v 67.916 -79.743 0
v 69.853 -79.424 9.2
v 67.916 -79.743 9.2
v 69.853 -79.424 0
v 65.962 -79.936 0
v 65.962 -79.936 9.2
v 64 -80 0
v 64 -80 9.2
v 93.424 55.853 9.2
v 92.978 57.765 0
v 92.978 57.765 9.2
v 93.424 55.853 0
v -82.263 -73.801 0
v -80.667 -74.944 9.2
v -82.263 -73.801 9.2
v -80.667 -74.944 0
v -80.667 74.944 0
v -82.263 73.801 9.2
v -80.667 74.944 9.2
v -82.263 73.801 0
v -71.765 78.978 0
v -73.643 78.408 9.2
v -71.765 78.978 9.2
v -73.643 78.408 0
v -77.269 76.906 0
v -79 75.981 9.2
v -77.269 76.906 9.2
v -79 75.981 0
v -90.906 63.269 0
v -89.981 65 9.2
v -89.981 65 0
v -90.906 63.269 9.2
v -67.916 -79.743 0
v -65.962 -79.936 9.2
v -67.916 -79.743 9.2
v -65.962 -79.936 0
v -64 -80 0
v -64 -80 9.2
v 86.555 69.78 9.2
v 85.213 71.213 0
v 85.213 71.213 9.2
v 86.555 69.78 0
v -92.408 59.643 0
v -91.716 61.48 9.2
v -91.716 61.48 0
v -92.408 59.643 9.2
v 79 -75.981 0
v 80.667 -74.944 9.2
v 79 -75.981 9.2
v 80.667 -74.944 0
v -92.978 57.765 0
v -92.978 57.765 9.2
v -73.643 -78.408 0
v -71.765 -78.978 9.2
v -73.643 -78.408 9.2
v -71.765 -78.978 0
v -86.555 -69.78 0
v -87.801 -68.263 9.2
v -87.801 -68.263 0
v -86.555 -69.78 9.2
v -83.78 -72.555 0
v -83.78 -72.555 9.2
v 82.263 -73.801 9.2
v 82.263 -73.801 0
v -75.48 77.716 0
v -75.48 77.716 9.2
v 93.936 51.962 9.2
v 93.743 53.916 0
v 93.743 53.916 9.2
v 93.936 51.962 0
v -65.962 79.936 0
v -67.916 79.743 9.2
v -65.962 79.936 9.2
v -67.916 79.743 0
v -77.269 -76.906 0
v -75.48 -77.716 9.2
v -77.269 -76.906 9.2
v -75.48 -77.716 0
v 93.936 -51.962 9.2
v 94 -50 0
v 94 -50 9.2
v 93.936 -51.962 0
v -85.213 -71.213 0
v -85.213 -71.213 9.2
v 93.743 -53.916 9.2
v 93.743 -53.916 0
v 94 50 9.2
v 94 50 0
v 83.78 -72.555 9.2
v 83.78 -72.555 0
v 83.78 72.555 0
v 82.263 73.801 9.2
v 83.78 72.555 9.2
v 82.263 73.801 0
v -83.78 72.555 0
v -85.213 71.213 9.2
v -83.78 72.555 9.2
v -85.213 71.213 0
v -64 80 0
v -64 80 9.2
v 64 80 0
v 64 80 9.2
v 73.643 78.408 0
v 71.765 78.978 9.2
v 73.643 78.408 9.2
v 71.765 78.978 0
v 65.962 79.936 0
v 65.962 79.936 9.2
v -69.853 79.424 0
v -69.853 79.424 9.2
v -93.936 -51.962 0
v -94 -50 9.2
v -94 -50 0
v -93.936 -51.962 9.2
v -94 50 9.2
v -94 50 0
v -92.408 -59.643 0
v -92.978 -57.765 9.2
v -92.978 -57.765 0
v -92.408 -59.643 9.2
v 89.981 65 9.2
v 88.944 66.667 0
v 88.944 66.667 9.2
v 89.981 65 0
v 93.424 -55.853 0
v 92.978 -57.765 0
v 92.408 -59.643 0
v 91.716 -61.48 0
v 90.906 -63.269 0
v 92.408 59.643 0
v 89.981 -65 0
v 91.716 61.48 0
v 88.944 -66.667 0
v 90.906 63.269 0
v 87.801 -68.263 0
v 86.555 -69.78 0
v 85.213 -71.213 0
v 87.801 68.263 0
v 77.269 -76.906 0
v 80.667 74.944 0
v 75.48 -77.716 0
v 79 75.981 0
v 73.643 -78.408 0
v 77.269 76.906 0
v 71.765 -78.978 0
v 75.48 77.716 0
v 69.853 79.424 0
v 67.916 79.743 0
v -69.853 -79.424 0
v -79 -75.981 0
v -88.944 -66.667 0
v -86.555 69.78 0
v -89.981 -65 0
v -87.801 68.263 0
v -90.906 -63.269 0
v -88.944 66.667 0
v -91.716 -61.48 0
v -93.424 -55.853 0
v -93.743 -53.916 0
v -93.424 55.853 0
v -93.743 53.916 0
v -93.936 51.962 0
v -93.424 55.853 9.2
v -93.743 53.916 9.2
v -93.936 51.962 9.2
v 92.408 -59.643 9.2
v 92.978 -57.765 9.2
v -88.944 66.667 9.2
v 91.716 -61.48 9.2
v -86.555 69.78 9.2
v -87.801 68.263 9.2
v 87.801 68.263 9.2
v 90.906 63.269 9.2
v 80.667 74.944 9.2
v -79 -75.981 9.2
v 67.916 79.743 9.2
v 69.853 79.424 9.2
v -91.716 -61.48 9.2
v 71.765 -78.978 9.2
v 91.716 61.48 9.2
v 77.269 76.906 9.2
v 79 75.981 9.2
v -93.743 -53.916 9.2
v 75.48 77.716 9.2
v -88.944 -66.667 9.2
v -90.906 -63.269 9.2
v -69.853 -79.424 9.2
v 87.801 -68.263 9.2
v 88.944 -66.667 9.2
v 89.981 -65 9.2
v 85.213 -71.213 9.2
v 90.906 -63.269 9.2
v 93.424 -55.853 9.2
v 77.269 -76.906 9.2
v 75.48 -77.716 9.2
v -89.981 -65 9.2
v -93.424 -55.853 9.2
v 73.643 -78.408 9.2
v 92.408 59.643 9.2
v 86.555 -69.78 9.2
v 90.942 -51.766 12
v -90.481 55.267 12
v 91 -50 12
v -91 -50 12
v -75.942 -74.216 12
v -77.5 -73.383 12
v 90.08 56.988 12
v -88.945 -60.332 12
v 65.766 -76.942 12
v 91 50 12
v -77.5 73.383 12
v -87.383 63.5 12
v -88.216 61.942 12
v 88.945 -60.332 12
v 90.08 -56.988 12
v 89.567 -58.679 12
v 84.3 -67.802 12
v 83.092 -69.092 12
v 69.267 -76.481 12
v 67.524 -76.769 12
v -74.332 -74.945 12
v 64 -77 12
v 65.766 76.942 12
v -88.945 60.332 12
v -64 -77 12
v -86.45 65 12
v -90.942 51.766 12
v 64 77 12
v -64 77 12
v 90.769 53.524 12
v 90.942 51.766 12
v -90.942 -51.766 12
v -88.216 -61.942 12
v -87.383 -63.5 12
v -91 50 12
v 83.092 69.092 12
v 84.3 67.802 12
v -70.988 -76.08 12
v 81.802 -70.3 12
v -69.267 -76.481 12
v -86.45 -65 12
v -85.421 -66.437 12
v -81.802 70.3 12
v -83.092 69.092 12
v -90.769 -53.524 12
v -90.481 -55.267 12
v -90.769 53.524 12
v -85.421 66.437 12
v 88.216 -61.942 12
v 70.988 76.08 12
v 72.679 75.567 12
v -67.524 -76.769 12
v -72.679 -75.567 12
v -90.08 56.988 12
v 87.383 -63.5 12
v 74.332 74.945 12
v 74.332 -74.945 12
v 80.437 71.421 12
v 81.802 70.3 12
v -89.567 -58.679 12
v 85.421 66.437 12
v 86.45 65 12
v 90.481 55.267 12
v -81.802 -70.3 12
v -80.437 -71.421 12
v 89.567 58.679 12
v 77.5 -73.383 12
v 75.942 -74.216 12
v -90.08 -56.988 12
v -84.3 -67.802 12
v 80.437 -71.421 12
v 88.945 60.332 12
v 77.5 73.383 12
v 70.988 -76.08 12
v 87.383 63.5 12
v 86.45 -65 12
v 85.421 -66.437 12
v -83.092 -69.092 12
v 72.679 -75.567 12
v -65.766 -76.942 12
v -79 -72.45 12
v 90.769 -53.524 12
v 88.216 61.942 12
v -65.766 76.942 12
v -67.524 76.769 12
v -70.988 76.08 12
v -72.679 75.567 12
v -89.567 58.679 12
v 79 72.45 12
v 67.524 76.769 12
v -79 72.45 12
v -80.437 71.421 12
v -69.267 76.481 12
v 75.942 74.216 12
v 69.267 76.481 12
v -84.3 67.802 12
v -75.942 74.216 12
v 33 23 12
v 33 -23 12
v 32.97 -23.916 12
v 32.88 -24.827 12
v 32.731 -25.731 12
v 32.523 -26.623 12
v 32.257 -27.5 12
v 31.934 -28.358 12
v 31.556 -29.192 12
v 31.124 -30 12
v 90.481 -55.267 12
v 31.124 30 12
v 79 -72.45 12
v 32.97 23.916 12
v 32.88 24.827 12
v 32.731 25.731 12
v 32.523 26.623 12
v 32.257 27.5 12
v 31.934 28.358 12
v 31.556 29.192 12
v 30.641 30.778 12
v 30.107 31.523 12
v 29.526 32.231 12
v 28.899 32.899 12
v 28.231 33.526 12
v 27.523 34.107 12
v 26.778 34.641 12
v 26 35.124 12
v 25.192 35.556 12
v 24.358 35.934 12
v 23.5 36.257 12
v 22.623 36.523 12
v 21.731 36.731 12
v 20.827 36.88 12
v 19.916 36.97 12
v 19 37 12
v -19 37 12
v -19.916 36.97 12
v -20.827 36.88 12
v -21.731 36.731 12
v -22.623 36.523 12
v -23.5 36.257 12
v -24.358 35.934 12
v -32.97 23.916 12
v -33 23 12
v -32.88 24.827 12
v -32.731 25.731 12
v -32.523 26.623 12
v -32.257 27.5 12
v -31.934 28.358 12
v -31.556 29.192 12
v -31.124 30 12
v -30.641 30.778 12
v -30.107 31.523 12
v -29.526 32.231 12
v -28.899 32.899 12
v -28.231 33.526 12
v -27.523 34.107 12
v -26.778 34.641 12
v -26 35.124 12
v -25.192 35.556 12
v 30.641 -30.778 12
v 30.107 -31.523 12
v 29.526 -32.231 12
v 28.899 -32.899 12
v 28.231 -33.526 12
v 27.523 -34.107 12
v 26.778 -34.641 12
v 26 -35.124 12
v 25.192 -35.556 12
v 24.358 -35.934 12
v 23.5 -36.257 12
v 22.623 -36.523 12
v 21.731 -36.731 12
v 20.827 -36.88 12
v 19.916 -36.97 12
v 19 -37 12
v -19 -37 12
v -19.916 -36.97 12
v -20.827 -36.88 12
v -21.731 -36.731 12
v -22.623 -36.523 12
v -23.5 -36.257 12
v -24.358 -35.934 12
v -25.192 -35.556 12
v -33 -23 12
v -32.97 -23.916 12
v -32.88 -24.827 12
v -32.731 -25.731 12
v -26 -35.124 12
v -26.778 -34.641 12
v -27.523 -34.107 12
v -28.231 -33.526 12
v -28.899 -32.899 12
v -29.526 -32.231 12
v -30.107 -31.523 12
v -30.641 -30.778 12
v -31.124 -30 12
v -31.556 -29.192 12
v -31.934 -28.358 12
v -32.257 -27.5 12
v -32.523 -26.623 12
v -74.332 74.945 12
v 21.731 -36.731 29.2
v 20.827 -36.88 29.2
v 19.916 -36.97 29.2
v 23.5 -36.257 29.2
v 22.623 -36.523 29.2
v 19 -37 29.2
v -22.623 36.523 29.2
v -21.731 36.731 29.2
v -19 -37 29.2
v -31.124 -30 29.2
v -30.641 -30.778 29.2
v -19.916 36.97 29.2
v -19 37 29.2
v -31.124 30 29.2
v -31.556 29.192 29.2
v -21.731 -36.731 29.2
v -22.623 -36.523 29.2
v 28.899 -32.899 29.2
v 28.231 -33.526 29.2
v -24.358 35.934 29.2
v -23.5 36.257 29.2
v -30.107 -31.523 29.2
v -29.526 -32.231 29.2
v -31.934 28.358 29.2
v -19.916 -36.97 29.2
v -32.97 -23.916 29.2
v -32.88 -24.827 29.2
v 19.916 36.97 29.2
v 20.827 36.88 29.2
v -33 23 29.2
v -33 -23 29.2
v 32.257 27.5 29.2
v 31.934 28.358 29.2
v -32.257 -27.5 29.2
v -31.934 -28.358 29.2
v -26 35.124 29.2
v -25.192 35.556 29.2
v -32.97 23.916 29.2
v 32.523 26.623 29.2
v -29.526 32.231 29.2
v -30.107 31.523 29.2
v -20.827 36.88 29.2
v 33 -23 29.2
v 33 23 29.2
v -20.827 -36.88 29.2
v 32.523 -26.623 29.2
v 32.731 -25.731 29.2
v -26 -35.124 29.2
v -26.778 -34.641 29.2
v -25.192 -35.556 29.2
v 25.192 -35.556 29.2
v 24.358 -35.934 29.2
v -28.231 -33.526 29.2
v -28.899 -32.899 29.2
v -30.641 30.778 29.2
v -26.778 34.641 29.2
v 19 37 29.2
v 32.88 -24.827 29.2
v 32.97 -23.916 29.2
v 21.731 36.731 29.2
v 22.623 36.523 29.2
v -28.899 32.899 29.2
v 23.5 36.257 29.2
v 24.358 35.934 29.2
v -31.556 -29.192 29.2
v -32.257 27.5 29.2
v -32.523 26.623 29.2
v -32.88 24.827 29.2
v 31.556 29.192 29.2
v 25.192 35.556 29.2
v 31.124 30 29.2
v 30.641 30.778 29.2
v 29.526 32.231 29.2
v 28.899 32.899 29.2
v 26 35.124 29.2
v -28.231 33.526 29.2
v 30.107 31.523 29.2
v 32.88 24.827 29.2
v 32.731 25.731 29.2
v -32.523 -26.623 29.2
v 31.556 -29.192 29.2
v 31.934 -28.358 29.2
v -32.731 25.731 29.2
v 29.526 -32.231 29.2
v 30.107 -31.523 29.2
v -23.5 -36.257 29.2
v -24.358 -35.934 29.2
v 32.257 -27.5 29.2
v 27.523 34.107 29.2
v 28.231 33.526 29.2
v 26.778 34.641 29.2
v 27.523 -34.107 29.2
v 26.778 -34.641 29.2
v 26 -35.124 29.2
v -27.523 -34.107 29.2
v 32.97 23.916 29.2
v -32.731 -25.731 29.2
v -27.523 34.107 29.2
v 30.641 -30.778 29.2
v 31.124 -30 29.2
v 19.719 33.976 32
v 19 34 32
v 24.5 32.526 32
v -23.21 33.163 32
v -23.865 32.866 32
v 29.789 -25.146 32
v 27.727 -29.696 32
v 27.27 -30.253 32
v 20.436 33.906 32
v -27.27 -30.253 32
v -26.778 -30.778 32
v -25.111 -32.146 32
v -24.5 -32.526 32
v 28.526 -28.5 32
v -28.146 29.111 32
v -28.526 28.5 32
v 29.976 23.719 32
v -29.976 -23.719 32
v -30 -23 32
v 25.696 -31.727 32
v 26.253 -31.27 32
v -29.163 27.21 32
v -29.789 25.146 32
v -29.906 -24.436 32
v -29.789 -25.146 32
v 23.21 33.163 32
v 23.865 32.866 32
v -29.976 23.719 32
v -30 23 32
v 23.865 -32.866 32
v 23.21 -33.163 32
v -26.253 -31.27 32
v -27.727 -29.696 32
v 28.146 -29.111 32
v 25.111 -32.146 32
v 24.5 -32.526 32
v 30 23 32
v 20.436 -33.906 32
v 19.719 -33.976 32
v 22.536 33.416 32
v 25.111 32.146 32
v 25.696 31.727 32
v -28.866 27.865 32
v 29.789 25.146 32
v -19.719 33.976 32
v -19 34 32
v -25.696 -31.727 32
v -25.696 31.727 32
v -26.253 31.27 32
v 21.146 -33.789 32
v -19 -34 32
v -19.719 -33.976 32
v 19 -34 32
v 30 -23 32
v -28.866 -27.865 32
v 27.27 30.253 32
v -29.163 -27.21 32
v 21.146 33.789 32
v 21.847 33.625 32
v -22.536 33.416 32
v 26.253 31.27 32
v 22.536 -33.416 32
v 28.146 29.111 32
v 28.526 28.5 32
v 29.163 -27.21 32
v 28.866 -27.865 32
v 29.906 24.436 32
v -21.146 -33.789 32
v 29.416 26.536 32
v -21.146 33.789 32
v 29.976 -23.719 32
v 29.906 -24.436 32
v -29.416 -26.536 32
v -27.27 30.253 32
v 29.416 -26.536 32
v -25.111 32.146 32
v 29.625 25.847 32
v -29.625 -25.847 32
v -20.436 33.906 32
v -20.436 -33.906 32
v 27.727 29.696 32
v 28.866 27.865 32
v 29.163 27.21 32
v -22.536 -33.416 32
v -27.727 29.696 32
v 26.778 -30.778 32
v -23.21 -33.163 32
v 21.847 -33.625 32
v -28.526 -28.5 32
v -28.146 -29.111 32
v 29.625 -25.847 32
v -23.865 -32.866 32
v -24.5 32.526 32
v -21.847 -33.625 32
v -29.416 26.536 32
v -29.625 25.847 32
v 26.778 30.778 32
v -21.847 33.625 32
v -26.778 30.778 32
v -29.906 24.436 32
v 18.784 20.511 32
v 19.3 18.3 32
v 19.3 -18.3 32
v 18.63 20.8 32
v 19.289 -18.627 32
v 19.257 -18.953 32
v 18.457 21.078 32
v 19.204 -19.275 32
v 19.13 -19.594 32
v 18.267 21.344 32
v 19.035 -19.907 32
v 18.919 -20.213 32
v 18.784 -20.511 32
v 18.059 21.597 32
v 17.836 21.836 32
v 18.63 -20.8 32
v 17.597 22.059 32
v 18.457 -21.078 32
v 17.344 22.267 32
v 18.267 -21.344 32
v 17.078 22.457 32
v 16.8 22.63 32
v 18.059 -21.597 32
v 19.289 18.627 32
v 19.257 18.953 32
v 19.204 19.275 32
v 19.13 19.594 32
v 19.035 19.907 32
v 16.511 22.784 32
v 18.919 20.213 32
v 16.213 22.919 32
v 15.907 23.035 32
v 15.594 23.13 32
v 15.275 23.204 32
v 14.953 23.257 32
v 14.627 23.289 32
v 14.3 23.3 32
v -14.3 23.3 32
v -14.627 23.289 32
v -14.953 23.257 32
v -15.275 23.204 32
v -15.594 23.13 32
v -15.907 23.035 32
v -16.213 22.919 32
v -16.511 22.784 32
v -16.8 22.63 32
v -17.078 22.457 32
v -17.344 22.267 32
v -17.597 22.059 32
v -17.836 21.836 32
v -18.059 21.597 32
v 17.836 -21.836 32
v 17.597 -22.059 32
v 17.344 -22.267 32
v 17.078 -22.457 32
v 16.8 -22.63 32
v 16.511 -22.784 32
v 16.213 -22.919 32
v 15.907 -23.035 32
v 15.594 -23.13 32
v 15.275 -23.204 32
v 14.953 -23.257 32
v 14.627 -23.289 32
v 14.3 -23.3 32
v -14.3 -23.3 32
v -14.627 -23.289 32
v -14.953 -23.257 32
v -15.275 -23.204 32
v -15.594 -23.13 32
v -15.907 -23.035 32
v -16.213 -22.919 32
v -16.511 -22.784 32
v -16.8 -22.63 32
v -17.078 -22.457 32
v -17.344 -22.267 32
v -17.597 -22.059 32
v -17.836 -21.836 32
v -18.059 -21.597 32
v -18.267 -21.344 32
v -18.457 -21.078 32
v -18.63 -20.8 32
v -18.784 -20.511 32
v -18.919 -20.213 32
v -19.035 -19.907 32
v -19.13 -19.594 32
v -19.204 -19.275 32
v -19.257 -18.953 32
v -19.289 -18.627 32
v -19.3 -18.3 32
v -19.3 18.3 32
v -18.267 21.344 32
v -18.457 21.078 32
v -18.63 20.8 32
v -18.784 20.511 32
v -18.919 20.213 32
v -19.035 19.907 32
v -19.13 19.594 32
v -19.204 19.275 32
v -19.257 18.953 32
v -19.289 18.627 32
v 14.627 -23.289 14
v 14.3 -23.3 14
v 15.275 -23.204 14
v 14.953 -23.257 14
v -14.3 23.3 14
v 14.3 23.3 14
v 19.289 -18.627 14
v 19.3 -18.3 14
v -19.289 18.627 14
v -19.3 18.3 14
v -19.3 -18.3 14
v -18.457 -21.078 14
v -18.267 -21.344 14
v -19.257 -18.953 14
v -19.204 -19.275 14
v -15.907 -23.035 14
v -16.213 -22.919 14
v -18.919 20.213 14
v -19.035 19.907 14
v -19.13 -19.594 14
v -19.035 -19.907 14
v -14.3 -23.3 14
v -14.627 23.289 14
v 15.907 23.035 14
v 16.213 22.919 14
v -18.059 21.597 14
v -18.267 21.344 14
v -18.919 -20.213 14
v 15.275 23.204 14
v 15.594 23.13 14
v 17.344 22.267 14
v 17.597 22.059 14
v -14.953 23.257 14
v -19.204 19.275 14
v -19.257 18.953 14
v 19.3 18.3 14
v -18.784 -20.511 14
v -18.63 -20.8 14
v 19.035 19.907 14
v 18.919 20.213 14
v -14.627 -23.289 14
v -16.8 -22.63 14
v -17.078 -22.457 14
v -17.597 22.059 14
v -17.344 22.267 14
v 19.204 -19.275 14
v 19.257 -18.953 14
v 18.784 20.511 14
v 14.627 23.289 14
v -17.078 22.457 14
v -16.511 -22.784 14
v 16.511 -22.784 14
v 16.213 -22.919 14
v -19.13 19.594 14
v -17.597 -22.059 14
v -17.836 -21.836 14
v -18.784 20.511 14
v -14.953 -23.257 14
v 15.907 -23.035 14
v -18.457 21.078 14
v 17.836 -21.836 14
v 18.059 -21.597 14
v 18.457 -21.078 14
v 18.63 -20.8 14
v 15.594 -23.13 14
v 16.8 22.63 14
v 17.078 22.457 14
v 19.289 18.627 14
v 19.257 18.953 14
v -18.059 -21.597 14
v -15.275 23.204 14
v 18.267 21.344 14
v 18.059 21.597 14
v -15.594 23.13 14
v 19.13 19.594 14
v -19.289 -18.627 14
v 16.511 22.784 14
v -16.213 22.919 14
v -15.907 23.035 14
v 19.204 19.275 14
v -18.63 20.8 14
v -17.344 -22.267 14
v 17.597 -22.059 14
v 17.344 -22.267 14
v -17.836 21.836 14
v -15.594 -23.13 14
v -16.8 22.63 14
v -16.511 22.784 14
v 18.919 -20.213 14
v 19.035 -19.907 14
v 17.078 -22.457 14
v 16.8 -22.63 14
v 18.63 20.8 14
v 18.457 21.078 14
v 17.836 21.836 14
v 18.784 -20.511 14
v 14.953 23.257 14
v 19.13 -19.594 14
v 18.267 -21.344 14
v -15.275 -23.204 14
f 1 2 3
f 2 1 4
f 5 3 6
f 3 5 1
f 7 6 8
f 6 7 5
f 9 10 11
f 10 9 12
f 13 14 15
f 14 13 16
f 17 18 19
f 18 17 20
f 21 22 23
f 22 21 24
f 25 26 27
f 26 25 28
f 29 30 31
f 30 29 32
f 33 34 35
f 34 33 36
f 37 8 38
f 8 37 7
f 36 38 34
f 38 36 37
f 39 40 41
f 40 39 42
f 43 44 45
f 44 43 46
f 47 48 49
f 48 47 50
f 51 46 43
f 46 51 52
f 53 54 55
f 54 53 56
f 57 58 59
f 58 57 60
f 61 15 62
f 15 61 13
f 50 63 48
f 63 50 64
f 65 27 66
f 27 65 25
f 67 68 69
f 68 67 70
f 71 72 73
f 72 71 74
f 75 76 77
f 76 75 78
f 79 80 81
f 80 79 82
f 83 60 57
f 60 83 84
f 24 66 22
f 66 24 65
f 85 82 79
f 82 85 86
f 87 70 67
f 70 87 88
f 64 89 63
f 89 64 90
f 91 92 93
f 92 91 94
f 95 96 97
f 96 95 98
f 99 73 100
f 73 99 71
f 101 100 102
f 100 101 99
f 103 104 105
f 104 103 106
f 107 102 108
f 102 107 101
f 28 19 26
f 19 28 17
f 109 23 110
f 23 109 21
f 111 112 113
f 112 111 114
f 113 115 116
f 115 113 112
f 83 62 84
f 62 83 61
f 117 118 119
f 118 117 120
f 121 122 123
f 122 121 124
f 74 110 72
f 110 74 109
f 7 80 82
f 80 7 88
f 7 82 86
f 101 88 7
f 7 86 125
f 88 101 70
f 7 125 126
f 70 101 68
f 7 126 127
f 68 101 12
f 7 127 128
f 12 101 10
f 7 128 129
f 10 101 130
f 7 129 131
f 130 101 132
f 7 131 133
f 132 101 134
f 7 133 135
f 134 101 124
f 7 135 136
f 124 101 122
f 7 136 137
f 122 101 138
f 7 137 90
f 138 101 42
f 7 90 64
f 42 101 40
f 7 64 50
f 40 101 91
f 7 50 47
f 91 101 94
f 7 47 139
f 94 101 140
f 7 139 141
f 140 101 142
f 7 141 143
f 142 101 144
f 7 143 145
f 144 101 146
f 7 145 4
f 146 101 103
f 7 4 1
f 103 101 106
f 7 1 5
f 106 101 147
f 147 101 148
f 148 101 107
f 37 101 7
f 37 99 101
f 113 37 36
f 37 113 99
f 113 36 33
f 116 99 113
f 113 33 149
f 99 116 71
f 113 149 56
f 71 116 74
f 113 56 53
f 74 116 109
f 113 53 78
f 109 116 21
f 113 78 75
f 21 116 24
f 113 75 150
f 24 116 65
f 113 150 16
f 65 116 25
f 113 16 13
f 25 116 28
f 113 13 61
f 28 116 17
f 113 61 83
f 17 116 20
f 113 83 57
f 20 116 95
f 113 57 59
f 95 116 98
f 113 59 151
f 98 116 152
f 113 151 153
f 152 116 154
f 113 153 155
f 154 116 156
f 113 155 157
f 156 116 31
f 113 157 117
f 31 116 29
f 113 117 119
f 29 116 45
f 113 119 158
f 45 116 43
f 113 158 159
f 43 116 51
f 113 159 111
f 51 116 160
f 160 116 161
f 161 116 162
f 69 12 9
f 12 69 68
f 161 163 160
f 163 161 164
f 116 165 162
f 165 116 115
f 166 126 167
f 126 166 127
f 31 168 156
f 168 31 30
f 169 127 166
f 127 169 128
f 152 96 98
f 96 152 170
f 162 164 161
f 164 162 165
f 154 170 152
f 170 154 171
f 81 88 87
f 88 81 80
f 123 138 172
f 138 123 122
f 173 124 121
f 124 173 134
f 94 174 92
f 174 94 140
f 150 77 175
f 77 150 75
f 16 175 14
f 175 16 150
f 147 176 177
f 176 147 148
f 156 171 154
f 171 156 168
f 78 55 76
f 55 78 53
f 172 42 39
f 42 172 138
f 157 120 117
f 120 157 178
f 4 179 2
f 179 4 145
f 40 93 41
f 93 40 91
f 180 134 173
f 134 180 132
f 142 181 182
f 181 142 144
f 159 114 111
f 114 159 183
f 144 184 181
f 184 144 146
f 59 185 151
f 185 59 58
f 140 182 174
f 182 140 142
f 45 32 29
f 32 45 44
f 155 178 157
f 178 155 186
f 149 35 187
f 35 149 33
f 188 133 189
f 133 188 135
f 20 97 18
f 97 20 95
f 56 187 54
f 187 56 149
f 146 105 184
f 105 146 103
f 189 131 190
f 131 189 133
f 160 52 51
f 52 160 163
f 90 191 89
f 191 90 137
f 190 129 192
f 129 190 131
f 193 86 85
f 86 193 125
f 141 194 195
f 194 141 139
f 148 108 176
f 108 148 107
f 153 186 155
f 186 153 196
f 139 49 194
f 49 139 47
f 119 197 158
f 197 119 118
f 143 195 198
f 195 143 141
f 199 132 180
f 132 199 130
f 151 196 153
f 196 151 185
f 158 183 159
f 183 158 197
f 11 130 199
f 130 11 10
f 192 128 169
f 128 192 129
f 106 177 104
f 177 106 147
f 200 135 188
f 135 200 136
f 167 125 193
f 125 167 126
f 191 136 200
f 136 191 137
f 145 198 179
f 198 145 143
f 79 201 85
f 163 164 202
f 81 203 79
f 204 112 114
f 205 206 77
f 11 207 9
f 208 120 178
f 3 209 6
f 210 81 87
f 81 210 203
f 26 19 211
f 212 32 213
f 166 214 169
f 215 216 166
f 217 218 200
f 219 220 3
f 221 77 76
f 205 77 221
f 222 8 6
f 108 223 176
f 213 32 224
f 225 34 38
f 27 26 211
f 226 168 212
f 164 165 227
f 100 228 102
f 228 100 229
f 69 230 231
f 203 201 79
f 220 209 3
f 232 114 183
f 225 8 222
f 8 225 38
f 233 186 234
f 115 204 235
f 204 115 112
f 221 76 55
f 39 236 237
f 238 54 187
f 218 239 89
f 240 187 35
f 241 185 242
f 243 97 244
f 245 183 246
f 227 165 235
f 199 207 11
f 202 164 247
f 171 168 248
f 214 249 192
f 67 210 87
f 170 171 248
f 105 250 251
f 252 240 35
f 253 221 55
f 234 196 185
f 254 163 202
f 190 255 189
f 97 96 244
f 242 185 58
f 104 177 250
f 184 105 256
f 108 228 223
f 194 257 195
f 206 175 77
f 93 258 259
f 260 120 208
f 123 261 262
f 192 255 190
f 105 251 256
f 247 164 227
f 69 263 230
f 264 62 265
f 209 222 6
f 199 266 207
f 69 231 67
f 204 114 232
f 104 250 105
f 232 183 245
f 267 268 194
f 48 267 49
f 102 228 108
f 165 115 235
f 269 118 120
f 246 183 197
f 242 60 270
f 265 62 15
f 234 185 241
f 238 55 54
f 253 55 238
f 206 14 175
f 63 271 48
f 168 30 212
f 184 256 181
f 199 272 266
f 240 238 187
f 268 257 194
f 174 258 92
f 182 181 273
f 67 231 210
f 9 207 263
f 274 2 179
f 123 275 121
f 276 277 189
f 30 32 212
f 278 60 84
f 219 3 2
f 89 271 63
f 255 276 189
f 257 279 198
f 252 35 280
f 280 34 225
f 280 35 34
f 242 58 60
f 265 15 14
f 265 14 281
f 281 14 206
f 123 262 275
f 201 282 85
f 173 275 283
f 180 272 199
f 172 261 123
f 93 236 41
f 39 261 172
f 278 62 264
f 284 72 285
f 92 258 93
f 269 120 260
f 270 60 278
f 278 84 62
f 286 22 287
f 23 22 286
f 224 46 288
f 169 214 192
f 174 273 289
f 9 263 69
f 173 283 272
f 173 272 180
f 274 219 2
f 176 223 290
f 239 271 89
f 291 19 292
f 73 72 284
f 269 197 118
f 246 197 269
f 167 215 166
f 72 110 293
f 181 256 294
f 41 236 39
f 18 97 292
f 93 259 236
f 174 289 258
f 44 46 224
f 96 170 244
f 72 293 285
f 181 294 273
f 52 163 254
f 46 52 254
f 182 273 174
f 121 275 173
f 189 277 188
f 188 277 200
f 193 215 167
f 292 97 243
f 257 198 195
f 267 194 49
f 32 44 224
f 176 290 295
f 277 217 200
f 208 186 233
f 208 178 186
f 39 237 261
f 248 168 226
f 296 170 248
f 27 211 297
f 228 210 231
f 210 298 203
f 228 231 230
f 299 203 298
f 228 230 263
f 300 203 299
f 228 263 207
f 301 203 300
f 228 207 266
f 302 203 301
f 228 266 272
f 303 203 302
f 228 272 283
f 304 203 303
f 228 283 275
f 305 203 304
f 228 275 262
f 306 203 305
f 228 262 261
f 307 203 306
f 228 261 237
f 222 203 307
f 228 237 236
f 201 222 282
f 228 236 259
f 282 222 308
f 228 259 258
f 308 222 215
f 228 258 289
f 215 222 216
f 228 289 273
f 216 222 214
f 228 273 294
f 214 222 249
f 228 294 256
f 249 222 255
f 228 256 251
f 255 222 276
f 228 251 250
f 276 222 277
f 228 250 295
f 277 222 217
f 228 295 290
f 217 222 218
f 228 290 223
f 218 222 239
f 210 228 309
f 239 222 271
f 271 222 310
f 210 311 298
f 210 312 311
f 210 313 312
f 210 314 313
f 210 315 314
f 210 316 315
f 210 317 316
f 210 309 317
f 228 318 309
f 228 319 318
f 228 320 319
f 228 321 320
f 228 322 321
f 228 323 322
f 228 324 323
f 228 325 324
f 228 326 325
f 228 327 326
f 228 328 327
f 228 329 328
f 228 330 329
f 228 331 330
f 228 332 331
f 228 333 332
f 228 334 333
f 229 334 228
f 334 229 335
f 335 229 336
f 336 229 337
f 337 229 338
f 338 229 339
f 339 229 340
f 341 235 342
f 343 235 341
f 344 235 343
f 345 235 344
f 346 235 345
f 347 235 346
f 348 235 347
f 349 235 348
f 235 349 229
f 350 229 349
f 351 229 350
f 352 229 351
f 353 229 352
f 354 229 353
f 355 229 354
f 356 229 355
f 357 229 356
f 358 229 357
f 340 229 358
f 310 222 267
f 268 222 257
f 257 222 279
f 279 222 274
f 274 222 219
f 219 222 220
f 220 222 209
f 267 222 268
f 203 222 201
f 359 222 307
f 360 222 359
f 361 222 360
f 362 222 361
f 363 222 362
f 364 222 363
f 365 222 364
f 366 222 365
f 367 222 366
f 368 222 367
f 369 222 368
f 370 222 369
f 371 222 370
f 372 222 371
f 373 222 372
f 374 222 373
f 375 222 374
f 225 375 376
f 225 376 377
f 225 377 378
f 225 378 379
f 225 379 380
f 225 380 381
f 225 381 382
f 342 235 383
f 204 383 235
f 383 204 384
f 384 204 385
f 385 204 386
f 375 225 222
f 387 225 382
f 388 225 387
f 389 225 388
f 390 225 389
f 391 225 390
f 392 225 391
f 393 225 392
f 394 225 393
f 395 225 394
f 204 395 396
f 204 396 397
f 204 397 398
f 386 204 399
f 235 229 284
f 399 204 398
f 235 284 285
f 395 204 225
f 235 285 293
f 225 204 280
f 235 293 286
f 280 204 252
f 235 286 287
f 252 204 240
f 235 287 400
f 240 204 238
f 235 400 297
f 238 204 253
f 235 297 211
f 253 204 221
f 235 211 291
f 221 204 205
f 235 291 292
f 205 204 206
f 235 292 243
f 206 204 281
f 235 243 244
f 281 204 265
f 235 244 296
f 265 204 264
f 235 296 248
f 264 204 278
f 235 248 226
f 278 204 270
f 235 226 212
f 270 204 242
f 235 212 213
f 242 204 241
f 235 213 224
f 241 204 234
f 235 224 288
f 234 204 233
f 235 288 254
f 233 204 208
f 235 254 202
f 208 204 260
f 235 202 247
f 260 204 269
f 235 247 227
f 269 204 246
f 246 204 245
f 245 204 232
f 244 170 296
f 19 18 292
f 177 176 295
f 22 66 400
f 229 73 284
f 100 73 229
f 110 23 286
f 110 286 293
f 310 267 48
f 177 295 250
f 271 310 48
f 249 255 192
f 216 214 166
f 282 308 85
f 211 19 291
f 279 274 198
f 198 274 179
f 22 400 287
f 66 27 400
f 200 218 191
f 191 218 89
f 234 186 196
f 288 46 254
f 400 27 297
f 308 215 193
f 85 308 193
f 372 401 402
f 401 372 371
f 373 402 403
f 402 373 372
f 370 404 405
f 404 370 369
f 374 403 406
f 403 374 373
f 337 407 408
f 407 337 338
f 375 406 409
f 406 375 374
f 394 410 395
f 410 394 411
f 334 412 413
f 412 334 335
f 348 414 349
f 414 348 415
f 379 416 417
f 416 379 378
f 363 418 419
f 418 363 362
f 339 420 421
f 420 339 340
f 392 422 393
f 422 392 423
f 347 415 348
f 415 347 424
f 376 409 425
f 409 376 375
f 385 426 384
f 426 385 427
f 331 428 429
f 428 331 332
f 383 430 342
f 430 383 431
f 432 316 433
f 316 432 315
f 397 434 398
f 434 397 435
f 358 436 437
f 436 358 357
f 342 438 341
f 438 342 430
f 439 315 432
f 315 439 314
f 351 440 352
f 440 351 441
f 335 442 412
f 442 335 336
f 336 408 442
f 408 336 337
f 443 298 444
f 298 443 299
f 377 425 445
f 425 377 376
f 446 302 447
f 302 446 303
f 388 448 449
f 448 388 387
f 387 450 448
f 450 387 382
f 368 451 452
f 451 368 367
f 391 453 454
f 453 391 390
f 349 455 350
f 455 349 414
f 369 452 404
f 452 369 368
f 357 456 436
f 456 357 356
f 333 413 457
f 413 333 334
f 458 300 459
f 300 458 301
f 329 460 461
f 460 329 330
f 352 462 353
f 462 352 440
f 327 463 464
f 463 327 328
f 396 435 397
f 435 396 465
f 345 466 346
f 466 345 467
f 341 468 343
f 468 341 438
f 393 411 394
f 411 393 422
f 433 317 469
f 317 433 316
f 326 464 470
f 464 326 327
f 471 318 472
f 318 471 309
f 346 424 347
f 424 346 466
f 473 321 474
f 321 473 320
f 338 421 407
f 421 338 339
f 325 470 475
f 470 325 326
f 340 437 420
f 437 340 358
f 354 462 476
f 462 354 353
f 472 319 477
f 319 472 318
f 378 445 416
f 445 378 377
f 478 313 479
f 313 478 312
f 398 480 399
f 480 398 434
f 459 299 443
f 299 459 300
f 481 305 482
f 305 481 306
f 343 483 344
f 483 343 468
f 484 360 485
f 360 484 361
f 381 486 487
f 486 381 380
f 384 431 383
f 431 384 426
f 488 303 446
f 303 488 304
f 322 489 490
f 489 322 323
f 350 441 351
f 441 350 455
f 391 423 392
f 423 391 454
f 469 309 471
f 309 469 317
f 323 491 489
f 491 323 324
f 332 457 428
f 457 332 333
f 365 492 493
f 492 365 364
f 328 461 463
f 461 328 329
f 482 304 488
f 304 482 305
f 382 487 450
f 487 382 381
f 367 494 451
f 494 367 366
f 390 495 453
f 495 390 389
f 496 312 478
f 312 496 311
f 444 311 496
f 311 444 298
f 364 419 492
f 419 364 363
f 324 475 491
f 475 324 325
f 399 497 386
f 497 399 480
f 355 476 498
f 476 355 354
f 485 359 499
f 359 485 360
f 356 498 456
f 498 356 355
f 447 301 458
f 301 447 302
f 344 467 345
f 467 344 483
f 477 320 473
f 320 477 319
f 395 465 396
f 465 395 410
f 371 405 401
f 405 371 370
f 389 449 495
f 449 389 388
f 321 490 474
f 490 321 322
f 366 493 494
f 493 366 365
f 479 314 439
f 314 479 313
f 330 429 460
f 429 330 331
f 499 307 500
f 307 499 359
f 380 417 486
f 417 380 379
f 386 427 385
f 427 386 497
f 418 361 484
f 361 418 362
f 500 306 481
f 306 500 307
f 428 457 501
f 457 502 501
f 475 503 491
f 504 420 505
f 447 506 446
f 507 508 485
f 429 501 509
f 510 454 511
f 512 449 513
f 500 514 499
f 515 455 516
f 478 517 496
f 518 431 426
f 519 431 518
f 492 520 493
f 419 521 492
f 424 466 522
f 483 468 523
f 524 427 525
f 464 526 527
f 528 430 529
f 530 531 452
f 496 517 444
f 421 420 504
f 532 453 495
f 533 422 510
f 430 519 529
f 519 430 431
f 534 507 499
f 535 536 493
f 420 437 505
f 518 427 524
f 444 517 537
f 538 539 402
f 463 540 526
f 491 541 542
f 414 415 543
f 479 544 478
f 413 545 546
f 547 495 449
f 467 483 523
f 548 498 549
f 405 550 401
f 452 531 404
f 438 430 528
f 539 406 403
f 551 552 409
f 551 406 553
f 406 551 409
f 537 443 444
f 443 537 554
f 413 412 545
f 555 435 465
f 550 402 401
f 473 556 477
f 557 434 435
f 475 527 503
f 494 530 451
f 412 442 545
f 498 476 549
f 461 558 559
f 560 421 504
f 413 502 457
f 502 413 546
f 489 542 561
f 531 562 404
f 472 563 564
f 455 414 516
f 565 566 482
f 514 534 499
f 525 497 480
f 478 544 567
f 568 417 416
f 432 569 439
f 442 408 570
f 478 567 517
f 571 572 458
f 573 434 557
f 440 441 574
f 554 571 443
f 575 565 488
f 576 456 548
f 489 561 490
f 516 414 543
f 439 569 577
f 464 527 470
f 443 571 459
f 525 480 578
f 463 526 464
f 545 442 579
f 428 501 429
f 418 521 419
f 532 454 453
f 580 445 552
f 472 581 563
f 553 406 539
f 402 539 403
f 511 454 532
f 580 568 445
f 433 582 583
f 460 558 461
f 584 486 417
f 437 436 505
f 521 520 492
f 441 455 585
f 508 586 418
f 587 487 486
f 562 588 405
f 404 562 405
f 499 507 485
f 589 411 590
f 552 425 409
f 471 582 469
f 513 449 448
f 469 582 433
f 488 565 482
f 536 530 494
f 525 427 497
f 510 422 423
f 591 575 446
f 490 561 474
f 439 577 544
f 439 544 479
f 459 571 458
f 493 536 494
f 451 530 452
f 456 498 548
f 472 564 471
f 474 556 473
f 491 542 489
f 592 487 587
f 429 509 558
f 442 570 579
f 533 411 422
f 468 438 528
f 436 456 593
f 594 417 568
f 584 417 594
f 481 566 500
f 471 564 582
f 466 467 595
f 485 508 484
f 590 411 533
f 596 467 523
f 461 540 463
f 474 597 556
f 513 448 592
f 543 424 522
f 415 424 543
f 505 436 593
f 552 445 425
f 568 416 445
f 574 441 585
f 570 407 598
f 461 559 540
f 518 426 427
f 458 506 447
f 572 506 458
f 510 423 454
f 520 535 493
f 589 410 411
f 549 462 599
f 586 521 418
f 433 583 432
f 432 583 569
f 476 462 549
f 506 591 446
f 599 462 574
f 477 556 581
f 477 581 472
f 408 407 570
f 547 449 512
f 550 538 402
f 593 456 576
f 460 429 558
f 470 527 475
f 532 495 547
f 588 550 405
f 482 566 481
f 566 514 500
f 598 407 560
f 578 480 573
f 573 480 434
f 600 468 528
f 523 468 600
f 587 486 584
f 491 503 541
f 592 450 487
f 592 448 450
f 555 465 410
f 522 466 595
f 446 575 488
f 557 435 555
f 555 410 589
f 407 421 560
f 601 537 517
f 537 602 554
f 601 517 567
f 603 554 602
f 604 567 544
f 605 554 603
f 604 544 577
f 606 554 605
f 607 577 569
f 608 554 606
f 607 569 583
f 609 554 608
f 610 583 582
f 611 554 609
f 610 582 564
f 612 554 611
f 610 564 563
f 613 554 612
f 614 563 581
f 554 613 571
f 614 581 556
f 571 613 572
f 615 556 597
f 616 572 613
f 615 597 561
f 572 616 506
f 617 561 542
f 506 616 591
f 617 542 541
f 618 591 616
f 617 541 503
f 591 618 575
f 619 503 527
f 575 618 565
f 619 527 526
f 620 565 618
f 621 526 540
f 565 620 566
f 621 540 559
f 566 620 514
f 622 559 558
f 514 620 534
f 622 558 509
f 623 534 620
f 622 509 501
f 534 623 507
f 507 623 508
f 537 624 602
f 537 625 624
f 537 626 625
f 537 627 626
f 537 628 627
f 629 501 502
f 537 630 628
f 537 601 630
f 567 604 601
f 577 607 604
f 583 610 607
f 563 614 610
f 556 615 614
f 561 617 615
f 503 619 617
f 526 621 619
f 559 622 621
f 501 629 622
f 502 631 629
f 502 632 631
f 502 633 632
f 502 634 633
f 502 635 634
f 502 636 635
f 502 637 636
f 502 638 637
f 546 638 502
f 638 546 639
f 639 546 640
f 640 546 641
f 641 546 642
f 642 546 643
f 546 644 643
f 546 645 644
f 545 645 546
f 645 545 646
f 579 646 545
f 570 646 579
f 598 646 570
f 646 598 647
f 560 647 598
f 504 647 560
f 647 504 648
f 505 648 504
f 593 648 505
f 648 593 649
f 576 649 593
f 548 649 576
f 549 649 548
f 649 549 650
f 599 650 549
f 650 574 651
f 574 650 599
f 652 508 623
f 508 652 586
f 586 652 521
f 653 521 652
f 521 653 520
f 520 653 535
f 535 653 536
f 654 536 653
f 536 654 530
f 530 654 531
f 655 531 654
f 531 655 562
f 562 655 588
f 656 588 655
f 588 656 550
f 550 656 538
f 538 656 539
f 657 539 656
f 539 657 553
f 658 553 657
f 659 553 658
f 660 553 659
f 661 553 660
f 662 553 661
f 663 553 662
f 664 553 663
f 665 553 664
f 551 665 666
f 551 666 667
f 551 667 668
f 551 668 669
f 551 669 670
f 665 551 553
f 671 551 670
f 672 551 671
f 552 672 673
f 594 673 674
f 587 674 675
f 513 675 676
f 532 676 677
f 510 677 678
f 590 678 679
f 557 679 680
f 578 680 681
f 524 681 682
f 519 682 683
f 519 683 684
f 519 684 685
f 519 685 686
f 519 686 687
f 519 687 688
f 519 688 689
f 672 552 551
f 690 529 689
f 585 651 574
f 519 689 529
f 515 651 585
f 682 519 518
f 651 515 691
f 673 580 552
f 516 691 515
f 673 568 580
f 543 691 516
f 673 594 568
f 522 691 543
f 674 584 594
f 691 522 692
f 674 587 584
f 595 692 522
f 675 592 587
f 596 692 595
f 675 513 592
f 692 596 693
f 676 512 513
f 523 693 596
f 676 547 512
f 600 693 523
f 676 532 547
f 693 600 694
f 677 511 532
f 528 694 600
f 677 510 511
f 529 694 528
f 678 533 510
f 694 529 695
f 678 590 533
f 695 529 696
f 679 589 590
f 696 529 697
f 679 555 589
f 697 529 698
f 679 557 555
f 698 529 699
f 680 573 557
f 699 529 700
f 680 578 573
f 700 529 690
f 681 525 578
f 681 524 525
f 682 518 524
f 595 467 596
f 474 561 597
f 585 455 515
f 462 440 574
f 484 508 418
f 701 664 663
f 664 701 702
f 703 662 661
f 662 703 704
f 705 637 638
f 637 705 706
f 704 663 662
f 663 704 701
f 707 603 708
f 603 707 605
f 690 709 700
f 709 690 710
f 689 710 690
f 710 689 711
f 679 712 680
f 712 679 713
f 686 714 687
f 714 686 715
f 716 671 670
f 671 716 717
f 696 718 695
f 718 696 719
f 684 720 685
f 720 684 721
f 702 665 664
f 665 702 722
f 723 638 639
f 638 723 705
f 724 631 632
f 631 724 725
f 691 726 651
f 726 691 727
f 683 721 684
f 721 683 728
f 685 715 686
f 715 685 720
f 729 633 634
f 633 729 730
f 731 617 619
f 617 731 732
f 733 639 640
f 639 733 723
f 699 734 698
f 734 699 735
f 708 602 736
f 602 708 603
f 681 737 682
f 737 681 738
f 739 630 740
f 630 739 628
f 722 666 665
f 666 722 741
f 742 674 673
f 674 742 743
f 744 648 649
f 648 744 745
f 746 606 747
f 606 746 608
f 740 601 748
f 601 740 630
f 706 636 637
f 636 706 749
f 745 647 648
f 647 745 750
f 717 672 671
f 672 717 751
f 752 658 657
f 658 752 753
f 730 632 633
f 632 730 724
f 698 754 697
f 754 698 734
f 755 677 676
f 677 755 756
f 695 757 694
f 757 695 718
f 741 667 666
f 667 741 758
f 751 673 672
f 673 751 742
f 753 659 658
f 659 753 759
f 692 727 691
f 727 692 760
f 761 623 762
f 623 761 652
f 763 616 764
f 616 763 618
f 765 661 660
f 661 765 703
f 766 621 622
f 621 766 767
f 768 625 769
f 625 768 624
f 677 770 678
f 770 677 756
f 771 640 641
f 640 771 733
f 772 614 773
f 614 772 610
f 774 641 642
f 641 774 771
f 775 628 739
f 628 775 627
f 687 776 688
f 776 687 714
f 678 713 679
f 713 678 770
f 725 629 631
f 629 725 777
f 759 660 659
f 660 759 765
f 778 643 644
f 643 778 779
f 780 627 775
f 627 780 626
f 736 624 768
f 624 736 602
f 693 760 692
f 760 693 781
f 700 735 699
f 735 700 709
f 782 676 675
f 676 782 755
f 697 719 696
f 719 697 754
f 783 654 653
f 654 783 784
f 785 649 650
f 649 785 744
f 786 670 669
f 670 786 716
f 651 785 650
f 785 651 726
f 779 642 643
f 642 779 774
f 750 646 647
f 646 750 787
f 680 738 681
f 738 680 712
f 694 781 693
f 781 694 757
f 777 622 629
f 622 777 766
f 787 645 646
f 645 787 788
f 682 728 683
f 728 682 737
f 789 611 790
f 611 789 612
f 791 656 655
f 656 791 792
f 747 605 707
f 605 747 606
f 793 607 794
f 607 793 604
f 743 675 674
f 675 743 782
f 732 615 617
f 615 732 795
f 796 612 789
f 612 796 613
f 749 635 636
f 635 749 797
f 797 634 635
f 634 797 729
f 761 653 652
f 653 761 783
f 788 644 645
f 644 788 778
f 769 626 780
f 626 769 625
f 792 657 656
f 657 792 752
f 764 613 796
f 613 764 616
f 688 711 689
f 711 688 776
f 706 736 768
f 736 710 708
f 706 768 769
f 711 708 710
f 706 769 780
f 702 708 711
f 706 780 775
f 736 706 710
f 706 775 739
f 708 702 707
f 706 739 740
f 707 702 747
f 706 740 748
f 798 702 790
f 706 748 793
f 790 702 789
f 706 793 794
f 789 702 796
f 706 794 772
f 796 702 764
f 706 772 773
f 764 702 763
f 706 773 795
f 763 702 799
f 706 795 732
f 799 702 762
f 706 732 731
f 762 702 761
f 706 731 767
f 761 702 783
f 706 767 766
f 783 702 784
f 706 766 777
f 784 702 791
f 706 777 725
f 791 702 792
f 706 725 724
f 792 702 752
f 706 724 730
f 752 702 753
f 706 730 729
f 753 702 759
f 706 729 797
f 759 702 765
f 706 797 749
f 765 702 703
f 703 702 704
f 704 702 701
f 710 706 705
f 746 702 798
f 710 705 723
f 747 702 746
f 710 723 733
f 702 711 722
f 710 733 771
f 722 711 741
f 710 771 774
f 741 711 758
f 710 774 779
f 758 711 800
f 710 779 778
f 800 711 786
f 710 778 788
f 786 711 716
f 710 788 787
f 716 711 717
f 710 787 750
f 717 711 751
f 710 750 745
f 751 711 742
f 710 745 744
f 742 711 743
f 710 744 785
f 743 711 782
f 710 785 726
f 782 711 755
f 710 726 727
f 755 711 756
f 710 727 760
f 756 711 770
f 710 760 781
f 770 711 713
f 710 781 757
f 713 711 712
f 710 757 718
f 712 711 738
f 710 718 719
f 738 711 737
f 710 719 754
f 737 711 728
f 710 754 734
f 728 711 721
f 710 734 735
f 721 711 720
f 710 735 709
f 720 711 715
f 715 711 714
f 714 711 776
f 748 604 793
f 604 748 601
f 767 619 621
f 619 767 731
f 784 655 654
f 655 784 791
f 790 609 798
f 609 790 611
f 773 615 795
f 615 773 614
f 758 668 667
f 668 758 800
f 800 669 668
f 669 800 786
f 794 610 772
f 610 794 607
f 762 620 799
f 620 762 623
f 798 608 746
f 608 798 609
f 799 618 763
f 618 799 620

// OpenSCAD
// Headphone stand in three printable parts: base, post, hanger.
// No glue, no screws. Rectangular (non-round) blade tenons prevent spinning.
// All dimensions in mm. Print orientation is the exported orientation (+Z up).
//
// Assembly heights (assembly coordinates, desk at z=0):
//   base plate/boss top        0 .. 32
//   post                       14.5 .. 250  (17.5 mm of it inside the base socket)
//   hanger tenon               228.5 .. 250 (21.5 mm inside the post socket)
//   hanger saddle top centre   270
// Socket clearances: 0.3 mm per side (socket is tenon + 0.6 in each dimension),
// tenon tips stop 0.5 mm above socket floors; shoulders/faces give the depth stop
// for the hanger, and the post bottoms in its socket.

part = "base"; // [base, post, hanger, assembly]
cadverify_only = "";

$fn = 96;

/* [Base] */
base_w = 188;          // desk footprint, X
base_d = 160;          // desk footprint, Y
base_plate_top = 9;    // straight plate wall up to here, then 45 deg chamfer to 12
base_top_plate = 12;
boss_w = 66;
boss_d = 74;
boss_straight_top = 29; // then 45 deg chamfer to boss_top
boss_top = 32;
base_socket_w = 38.6;  // post 38 + 0.6
base_socket_d = 46.6;  // post 46 + 0.6
base_socket_floor = 14;

/* [Post] */
post_w = 38;
post_d = 46;
post_len = 235.5;      // tip (local z=0) to top (assembly 250)
post_top_socket_w = 24.6; // hanger tenon 24 + 0.6
post_top_socket_d = 34.6; // hanger tenon 34 + 0.6
post_top_socket_floor_local = 213.5; // assembly 228

/* [Hanger, modelled in print coordinates] */
// Print coordinates: X = saddle length, Y = height above tenon tip,
// Z = saddle width direction (part lies on its Z=0 side face on the bed).
hang_len_half = 69;    // overall saddle half length incl. rounded end point
hang_width = 34;       // >= 30 mm headband support width
hang_top_rel = 41.5;   // tenon tip to saddle crown; assembly 228.5 + 41.5 = 270
hang_arc_r = 170;      // crown radius of the headband contact surface
hang_plate_t = 10;     // saddle plate thickness (vertical, in profile)
hang_tenon_half_w = 12;  // tenon is 24 (X) x 34 (width)
hang_shoulder_rel = 21.5; // assembly 250, post top
hang_neck_half_w = 17;

function hang_top_z(x) = hang_top_rel - (hang_arc_r - sqrt(hang_arc_r*hang_arc_r - x*x));
function hang_bot_z(x) = hang_top_z(x) - hang_plate_t;

module rounded_rect(w, d, r) {
    offset(r = r) square([w - 2*r, d - 2*r], center = true);
}

module instance(name, part_name, unit = 1) {
    echo(cadverify_instance = [name, part_name, unit]);
    if (cadverify_only == "" || cadverify_only == name) children();
}

/* ---------- BASE (print = assembly orientation) ---------- */
module base_part() {
    difference() {
        union() {
            // desk plate with 45 deg top edge chamfer
            linear_extrude(base_plate_top) rounded_rect(base_w, base_d, 30);
            hull() {
                translate([0, 0, base_plate_top]) linear_extrude(0.2)
                    rounded_rect(base_w, base_d, 30);
                translate([0, 0, base_top_plate - 0.2]) linear_extrude(0.2)
                    rounded_rect(base_w - 6, base_d - 6, 27);
            }
            // raised boss / collar around the post socket, 45 deg top chamfer
            translate([0, 0, base_top_plate])
                linear_extrude(boss_straight_top - base_top_plate)
                    rounded_rect(boss_w, boss_d, 14);
            hull() {
                translate([0, 0, boss_straight_top]) linear_extrude(0.2)
                    rounded_rect(boss_w, boss_d, 14);
                translate([0, 0, boss_top - 0.2]) linear_extrude(0.2)
                    rounded_rect(boss_w - 6, boss_d - 6, 11);
            }
        }
        // blind rectangular socket for the post (stops post spinning)
        translate([0, 0, base_socket_floor])
            linear_extrude(boss_top - base_socket_floor + 2)
                rounded_rect(base_socket_w, base_socket_d, 5);
    }
}

/* ---------- POST (printed upright, local z=0 is tenon tip) ---------- */
module post_part() {
    difference() {
        linear_extrude(post_len) rounded_rect(post_w, post_d, 8);
        // blind rectangular socket in the top for the hanger blade tenon
        translate([0, 0, post_top_socket_floor_local])
            linear_extrude(post_len - post_top_socket_floor_local + 2)
                rounded_rect(post_top_socket_w, post_top_socket_d, 5);
    }
}

/* ---------- HANGER (printed on its side) ---------- */
module hanger_part() {
    top_pts    = [for (x = [56 : -8 : -56]) [x, hang_top_z(x)]];
    bot_r_pts  = [for (x = [40 : 8 : 64]) [x, hang_bot_z(x)]];
    bot_l_pts  = [for (x = [-64 : 8 : -40]) [x, hang_bot_z(x)]];
    mid64 = (hang_top_z(64) + hang_bot_z(64)) / 2;
    profile = concat(
        [[-10, 0], [10, 0], [12, 2], [12, hang_shoulder_rel],
         [hang_neck_half_w, hang_shoulder_rel], [30, hang_bot_z(30)]],
        bot_r_pts,
        [[hang_len_half - 0.5, mid64], [64, hang_top_z(64)]],
        top_pts,
        [[-64, hang_top_z(64)], [-(hang_len_half - 0.5), mid64], [-64, hang_bot_z(64)]],
        bot_l_pts,
        [[-30, hang_bot_z(30)], [-hang_neck_half_w, hang_shoulder_rel],
         [-hang_tenon_half_w, hang_shoulder_rel], [-12, 2]]
    );
    difference() {
        linear_extrude(hang_width) polygon(profile);
        // 45 deg chamfers on the two crown side edges, centre contact zone only.
        // Plane (print coords): Z + Y = 38.5 + 34 on the far side ...
        translate([0, 38.5, hang_width]) rotate([-45, 0, 0])
            translate([-85, -40, 0]) cube([170, 80, 40]);
        // ... and Z - Y = -38.5 on the bed side.
        translate([0, 38.5, 0]) rotate([45, 0, 0])
            translate([-85, -40, -40]) cube([170, 80, 40]);
    }
}

/* ---------- Spec echoes ---------- */
if (part == "base") {
    echo(cadverify_spec = [
        ["bounds", [[-base_w/2, -base_d/2, 0], [base_w/2, base_d/2, boss_top]]],
        ["bodies", 1],
        ["through_holes", 0],
        ["support_faces", [["desk", "-z", 25000]]],
        ["overhangs_allowed", []],
        ["copies", 1],
        ["details", [
            ["plate", "material", [[-80, -60, 2], [80, 60, 10]], 0.99],
            ["boss_wall", "material", [[22, -30, 16], [31, 30, 28]], 0.99],
            ["post_socket", "void", [[-17, -21, 16], [17, 21, 30]], 0.99],
            ["socket_floor", "thickness", [0, 0, 42], [0, 0, -1], base_socket_floor],
            ["boss_socket_top", "view", [[-34, -38, 27], [34, 38, boss_top]]]
        ]]
    ]);
} else if (part == "post") {
    echo(cadverify_spec = [
        ["bounds", [[-post_w/2, -post_d/2, 0], [post_w/2, post_d/2, post_len]]],
        ["bodies", 1],
        ["through_holes", 0],
        ["support_faces", [["bed", "-z", 1500]]],
        ["overhangs_allowed", []],
        ["copies", 1],
        ["details", [
            ["column", "material", [[-16, -20, 30], [16, 20, 200]], 0.99],
            ["hanger_socket", "void", [[-10, -15, 216], [10, 15, 234]], 0.99],
            ["column_width", "thickness", [32, 0, 100], [-1, 0, 0], post_w],
            ["top_socket", "view", [[-19, -23, 210], [19, 23, post_len]]]
        ]]
    ]);
} else if (part == "hanger") {
    echo(cadverify_spec = [
        ["bounds", [[-hang_len_half, 0, 0], [hang_len_half, hang_top_rel, hang_width]]],
        ["bodies", 1],
        ["through_holes", 0],
        ["support_faces", [["bed", "-z", 1200]]],
        ["overhangs_allowed", [
            ["45deg crown chamfer on bed side", [[-36, 37, 0], [36, hang_top_rel, 5]]]
        ]],
        ["copies", 1],
        ["details", [
            ["saddle_plate", "material", [[-25, 32, 5], [25, 38, 29]], 0.99],
            ["tenon", "material", [[-10, 2, 5], [10, 20, 29]], 0.99],
            ["saddle_thickness", "thickness", [50, 52, 17], [0, -1, 0], hang_plate_t],
            ["rounded_crown", "view", [[-40, 27, 0], [40, hang_top_rel, hang_width]]]
        ]]
    ]);
} else if (part == "assembly") {
    echo(cadverify_spec = [
        ["bounds", [[-base_w/2, -base_d/2, 0], [base_w/2, base_d/2, 270]]],
        ["support_faces", [["desk", "-z", 25000]]],
        ["allowed_interferences", []],
        ["assembly_order", [
            [["base"], [0, 0, 0]],
            [["post"], [0, 0, -1]],
            [["hanger"], [0, 0, -1]]
        ]]
    ]);
}

/* ---------- Output ---------- */
if (part == "base") {
    base_part();
} else if (part == "post") {
    post_part();
} else if (part == "hanger") {
    hanger_part();
} else if (part == "assembly") {
    instance("base", "base") base_part();
    instance("post", "post") translate([0, 0, 14.5]) post_part();
    // hanger print coords (x, y=height, z=width) -> assembly (x, z-17, 270-y)
    instance("hanger", "hanger")
        translate([0, -hang_width/2, 270]) rotate([-90, 0, 0]) hanger_part();
} else {
    assert(false, str("unknown part: ", part));
}
